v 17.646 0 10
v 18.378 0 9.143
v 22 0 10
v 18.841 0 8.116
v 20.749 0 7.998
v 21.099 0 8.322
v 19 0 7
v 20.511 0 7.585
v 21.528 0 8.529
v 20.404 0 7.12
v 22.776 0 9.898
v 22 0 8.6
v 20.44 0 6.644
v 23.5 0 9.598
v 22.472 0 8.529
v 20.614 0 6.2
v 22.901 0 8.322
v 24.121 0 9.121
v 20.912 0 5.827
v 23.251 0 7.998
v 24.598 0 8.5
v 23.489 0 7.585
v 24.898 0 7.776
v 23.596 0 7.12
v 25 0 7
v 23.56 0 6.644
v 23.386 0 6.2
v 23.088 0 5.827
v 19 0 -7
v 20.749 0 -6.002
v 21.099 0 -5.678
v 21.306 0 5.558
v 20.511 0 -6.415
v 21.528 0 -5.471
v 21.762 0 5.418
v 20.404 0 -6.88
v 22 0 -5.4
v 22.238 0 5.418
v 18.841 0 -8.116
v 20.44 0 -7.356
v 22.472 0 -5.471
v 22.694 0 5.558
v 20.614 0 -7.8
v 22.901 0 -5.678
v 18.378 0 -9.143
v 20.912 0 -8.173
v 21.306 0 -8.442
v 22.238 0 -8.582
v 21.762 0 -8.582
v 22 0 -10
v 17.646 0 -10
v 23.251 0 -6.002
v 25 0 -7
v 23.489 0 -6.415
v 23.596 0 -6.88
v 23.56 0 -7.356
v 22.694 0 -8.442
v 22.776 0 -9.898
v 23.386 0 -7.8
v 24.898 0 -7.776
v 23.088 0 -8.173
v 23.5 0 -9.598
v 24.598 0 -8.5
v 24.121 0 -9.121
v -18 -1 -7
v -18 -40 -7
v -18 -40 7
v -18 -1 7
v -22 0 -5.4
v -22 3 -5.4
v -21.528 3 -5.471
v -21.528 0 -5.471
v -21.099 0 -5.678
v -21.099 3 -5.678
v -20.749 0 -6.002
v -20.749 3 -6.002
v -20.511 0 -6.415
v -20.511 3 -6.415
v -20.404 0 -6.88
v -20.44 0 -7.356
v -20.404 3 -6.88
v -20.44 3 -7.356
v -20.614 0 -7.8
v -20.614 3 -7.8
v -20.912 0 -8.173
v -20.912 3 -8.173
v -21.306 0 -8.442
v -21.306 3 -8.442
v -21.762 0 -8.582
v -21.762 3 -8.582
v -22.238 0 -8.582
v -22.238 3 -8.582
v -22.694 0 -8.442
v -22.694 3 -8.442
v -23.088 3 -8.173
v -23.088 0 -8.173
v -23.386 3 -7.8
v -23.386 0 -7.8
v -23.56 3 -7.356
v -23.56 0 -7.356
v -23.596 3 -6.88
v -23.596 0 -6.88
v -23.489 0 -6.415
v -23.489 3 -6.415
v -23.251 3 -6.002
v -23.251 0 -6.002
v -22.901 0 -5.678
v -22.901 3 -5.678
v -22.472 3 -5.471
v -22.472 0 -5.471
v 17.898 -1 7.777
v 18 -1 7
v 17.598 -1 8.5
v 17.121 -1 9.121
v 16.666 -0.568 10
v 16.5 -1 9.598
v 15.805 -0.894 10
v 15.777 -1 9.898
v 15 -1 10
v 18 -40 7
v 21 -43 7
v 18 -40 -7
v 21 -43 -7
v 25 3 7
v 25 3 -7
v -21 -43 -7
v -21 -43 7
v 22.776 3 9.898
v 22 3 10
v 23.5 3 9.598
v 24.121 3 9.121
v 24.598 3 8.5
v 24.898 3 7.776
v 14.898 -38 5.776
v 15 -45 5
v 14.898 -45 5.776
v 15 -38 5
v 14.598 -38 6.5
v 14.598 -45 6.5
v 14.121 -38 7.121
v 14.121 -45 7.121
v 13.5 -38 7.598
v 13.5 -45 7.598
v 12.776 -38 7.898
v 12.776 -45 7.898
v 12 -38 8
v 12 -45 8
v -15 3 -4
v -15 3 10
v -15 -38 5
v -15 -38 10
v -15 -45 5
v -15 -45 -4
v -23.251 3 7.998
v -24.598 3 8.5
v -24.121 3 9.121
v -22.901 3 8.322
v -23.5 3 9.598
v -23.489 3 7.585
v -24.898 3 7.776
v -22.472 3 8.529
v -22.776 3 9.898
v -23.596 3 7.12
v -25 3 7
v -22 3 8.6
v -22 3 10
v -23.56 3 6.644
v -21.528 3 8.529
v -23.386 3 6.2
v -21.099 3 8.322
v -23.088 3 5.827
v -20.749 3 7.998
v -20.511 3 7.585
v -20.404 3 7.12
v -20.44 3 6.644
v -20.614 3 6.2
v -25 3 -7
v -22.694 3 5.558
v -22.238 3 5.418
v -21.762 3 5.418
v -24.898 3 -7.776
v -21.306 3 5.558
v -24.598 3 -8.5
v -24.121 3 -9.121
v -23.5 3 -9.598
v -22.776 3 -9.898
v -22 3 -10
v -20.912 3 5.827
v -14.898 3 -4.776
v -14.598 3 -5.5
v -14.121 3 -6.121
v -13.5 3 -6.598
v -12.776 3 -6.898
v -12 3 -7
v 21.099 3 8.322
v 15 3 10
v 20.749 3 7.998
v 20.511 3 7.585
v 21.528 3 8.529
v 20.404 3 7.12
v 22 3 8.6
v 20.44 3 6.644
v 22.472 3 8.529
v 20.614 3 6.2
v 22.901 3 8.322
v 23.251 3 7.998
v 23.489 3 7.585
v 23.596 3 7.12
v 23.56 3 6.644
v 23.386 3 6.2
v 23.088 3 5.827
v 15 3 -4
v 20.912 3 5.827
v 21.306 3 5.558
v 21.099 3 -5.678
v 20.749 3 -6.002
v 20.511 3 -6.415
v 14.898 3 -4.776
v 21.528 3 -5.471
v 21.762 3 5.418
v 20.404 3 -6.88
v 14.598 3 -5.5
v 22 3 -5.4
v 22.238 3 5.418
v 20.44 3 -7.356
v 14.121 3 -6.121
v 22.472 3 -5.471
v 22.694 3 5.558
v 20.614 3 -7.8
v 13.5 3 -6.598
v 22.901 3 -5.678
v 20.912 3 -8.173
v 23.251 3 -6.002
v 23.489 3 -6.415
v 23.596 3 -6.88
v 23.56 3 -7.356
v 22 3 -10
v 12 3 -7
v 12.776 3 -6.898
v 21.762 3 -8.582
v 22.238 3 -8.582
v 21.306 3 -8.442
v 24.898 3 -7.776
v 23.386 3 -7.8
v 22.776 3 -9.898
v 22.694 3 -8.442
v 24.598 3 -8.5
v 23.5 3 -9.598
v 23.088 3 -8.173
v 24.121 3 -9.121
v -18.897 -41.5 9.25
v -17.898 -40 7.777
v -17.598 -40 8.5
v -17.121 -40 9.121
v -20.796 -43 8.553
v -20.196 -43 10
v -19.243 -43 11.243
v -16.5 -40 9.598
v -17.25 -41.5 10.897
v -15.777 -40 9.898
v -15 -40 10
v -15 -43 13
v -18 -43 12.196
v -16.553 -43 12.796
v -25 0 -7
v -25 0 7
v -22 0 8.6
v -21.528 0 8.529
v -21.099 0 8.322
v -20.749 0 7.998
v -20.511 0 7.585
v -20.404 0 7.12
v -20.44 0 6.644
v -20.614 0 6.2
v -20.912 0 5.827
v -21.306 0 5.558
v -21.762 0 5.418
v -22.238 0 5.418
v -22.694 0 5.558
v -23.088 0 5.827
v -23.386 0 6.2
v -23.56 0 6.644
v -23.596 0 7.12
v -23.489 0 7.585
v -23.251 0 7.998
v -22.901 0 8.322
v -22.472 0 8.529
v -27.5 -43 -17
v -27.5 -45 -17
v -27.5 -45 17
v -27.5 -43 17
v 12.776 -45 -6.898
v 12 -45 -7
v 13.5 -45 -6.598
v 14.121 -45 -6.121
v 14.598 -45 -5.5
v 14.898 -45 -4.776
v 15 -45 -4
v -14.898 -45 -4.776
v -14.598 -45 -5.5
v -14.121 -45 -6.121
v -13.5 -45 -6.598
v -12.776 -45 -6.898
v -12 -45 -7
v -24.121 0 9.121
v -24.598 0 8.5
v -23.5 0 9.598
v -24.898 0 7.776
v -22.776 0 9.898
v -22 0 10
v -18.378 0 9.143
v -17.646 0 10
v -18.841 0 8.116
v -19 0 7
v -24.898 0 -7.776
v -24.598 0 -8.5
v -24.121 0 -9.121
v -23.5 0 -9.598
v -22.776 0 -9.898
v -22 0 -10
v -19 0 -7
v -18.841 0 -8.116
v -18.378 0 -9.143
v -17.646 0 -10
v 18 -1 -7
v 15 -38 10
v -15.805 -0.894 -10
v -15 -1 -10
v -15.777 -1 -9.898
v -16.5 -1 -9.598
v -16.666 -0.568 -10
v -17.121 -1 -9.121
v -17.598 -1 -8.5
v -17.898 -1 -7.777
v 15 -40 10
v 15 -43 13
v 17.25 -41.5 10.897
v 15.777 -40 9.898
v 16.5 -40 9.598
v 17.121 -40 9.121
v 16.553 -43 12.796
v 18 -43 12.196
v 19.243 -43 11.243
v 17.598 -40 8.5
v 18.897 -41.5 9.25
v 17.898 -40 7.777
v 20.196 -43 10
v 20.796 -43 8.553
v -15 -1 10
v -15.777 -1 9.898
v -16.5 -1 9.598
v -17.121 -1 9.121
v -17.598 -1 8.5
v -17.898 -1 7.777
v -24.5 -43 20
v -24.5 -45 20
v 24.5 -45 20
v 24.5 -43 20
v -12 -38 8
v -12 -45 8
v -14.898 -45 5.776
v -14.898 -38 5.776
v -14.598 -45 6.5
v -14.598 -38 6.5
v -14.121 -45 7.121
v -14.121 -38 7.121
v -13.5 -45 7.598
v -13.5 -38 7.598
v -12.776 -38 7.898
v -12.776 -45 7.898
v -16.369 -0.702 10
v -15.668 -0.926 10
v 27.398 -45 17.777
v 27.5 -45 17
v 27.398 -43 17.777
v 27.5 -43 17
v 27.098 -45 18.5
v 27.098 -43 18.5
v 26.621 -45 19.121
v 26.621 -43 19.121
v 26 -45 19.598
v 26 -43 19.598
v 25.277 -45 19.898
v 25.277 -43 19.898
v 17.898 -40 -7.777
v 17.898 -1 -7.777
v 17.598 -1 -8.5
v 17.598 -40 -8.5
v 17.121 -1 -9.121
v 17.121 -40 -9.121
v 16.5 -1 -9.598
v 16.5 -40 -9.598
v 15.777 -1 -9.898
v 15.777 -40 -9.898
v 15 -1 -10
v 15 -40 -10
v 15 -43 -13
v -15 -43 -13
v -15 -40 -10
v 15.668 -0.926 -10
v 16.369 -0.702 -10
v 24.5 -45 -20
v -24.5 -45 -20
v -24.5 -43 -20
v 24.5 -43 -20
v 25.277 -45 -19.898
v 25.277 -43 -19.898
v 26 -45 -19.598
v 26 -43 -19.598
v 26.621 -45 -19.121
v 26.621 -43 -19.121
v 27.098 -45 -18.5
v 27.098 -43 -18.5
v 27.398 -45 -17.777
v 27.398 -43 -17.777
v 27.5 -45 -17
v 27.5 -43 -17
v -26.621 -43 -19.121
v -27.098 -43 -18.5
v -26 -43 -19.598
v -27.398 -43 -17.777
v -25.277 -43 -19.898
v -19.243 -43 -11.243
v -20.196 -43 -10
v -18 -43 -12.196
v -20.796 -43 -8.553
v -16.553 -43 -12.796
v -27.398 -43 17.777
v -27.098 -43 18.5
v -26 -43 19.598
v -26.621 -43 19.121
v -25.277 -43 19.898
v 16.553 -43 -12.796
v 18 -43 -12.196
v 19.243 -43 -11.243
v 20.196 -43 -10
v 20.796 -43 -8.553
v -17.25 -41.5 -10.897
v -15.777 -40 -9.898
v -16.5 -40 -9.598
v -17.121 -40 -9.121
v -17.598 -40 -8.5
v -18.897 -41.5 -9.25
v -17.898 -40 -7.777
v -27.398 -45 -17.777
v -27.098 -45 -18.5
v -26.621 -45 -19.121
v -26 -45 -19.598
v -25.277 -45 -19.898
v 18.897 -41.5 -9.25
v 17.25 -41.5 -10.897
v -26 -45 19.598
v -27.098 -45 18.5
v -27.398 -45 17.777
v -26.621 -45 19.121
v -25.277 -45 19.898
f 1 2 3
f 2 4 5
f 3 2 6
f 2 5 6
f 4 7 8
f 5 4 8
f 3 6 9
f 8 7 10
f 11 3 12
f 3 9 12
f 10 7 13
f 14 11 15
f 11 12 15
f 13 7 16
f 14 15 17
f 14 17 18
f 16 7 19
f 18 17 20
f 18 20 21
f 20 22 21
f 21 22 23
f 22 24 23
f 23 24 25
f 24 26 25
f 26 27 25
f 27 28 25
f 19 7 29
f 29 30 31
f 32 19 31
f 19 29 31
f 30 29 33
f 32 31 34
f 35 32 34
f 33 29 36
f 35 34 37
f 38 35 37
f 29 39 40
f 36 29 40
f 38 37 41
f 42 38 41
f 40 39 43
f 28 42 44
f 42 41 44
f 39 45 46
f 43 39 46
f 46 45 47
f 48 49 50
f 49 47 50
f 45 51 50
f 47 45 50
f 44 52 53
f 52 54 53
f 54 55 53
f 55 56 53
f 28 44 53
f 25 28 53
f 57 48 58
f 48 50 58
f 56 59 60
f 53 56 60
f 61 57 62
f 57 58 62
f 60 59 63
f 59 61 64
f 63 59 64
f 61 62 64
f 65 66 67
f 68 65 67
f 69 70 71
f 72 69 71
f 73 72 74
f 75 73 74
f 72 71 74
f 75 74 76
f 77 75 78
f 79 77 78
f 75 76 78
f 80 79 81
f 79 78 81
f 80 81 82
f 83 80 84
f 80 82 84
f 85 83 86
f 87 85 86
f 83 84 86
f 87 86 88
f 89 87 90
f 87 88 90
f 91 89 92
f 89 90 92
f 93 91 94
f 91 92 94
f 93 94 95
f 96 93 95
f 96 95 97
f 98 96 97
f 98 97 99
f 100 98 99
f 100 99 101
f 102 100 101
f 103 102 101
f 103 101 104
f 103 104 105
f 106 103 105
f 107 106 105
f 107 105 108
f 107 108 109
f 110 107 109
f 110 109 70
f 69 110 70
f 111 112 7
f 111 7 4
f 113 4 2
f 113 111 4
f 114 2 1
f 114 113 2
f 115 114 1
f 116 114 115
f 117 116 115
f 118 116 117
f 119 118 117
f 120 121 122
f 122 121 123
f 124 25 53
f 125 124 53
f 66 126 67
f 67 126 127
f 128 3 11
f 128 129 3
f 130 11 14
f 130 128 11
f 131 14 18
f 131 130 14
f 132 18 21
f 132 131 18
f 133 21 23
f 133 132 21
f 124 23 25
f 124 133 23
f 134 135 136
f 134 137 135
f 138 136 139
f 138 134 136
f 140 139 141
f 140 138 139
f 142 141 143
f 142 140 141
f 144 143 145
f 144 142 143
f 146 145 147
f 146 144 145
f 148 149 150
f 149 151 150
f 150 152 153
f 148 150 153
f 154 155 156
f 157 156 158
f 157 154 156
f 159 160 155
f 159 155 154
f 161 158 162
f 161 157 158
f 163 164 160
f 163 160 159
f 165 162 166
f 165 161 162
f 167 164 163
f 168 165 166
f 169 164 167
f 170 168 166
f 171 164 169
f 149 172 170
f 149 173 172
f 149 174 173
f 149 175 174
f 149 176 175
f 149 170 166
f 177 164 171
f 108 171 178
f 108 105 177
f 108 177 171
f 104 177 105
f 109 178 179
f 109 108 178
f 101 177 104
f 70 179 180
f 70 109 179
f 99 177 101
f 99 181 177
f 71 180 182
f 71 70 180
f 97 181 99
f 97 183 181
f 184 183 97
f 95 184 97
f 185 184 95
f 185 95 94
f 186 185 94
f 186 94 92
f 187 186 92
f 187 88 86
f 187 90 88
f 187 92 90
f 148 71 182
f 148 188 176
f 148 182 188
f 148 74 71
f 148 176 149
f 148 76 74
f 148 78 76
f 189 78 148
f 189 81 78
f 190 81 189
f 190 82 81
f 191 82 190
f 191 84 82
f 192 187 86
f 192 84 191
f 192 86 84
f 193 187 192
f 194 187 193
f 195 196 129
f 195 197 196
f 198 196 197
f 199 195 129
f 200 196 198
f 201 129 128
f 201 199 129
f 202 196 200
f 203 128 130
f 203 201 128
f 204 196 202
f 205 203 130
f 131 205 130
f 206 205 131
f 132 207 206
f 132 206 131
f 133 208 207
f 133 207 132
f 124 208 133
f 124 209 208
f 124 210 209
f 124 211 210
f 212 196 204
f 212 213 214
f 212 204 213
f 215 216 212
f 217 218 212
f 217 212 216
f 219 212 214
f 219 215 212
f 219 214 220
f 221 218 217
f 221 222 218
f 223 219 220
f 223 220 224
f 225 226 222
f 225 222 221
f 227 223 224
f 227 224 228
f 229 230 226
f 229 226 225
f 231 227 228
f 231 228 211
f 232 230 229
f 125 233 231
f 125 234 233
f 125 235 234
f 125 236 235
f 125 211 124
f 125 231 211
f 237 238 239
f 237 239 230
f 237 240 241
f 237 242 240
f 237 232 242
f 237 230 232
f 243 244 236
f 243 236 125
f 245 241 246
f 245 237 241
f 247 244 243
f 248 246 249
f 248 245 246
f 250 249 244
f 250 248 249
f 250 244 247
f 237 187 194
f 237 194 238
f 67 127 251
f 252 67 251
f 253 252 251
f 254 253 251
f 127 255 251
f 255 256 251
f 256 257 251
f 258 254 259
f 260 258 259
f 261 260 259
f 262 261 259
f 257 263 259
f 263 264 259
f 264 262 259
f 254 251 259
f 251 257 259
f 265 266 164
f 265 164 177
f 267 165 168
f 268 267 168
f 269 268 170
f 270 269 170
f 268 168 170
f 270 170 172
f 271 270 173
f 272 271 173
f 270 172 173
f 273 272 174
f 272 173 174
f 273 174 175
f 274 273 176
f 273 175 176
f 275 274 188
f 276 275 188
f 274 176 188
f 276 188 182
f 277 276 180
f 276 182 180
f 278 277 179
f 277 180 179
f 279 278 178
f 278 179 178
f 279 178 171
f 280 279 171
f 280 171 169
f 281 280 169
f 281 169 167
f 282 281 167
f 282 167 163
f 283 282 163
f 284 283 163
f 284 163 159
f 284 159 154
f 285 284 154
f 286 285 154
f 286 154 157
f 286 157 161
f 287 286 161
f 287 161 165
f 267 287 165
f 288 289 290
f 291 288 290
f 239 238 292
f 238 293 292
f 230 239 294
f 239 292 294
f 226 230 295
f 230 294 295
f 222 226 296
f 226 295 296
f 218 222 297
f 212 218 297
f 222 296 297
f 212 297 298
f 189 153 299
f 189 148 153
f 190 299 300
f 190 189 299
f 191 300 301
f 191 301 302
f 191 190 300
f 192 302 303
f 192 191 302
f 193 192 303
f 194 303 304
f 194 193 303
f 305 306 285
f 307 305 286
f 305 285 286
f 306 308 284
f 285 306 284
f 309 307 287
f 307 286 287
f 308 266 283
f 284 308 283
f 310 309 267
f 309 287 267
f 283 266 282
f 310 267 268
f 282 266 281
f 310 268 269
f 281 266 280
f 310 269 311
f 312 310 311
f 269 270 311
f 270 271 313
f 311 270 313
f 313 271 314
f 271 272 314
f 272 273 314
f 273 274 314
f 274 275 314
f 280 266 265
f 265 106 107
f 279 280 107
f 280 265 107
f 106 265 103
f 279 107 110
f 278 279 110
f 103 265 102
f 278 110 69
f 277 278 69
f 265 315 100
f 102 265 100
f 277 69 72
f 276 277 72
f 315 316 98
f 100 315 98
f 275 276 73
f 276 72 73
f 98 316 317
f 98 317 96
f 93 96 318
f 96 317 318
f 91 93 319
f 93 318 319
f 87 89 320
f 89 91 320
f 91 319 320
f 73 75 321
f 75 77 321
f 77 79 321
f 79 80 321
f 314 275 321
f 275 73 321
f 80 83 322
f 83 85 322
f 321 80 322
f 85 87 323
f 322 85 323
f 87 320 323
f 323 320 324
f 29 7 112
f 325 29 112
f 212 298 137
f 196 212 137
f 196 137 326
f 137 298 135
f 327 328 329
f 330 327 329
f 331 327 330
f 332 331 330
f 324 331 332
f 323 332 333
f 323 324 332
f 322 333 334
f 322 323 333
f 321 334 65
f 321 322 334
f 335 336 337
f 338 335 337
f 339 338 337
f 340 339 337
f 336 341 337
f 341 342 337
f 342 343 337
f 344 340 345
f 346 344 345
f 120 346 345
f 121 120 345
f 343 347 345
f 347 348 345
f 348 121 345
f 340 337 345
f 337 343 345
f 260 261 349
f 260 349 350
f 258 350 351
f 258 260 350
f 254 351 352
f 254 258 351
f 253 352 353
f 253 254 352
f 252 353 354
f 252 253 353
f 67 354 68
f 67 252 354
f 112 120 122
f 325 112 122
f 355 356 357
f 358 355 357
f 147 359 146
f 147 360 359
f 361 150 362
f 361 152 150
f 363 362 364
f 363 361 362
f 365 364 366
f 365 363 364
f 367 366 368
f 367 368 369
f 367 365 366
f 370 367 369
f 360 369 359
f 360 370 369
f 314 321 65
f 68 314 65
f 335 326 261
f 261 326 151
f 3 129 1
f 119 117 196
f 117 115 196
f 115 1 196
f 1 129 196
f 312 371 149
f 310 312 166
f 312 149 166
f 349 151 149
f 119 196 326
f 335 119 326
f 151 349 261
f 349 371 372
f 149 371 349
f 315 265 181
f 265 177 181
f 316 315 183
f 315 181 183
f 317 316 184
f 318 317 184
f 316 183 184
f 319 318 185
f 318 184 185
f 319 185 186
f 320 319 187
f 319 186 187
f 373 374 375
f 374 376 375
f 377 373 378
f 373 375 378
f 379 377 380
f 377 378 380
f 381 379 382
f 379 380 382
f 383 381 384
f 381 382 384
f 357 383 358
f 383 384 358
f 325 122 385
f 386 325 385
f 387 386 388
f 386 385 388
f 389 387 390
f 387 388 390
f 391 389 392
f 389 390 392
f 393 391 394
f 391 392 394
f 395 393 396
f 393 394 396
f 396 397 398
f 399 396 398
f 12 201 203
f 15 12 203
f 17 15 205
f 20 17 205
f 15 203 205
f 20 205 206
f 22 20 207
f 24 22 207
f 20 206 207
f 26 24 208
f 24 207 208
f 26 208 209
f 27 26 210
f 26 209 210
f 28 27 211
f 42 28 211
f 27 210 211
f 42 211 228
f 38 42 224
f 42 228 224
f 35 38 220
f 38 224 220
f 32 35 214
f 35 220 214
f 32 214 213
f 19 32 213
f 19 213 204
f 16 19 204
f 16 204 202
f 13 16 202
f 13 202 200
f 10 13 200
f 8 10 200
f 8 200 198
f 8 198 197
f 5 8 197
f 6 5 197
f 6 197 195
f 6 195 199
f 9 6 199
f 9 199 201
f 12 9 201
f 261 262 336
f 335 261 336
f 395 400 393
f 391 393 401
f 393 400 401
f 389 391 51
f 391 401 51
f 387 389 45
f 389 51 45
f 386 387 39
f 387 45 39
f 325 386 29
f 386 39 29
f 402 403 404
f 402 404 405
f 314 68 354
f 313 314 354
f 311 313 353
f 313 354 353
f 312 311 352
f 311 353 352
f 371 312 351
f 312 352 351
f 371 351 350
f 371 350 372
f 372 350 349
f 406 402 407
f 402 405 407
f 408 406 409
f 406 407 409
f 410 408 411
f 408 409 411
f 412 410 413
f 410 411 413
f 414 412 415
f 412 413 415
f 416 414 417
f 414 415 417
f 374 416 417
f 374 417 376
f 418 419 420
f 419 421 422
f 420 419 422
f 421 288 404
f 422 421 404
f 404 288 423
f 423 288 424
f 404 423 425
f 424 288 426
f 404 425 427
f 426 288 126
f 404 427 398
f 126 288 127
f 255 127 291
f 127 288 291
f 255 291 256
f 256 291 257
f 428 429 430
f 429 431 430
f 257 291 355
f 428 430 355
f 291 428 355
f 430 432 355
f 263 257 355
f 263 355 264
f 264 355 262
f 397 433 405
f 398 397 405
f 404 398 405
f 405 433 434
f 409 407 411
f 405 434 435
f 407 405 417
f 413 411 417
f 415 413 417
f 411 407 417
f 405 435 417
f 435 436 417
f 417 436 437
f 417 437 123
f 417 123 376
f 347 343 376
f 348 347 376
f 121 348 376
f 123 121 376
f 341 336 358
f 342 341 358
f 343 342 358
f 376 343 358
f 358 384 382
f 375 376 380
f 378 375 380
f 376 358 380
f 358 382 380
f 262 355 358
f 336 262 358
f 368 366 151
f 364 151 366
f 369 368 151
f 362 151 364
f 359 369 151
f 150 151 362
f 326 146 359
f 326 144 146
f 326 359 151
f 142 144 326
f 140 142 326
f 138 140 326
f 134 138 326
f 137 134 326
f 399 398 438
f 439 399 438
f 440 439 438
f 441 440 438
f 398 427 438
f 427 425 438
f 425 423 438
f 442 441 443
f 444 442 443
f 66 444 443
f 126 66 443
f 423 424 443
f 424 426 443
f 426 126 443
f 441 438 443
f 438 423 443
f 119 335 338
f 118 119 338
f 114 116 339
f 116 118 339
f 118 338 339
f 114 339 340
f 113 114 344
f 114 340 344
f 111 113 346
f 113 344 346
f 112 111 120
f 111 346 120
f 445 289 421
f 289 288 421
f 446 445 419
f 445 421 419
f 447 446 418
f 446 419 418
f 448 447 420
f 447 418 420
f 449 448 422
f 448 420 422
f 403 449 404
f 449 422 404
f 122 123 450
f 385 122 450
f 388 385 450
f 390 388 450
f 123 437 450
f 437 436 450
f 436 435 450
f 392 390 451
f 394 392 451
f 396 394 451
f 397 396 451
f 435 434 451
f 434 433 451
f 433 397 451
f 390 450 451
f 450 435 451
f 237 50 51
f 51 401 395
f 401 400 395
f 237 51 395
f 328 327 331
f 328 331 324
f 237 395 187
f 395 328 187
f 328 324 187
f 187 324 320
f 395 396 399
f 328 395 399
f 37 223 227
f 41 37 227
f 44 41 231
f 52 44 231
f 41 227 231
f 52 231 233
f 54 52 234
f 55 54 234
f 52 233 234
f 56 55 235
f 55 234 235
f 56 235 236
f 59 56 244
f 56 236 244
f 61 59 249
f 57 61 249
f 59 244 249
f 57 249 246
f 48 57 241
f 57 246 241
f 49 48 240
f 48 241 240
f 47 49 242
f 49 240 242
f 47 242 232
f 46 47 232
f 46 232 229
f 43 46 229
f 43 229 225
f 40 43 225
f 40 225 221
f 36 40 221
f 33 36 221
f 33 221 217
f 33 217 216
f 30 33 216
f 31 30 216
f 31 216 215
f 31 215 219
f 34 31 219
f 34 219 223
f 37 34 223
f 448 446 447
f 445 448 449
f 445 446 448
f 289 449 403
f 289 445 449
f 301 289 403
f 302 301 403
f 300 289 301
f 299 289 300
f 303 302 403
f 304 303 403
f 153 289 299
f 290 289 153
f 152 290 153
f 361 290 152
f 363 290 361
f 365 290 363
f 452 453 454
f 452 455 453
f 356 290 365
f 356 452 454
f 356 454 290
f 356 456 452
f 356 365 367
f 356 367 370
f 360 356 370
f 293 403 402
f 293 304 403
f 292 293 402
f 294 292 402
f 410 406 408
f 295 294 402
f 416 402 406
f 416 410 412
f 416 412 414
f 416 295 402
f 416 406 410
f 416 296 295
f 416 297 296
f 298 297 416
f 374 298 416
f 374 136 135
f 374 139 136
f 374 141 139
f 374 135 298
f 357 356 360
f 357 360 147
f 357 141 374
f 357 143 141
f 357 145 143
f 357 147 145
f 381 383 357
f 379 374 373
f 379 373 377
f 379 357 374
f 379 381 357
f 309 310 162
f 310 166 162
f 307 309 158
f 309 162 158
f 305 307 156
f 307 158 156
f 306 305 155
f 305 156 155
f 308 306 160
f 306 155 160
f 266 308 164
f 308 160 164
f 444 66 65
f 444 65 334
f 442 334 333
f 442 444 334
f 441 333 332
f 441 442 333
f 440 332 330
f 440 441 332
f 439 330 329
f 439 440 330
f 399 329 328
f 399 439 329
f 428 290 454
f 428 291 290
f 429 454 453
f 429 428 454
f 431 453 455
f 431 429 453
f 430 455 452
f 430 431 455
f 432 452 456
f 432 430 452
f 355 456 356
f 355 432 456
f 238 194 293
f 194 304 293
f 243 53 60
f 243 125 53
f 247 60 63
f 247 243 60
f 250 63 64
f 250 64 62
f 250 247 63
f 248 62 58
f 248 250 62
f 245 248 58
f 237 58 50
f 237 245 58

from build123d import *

# Parameters (mm, degrees)
SKETCH_1_W          = 30
SKETCH_1_H          = 3
EXTRUDE_1_DEPTH     = 45
SKETCH_1_3_W        = 7
SKETCH_1_3_H        = 20
SKETCH_1_3_W_2      = 30
SKETCH_1_3_H_2      = 3
EXTRUDE_2_DEPTH     = 3
SKETCH_2_W          = 55
SKETCH_2_H          = 40
EXTRUDE_3_DEPTH     = 2
SKETCH_3_W          = 30
SKETCH_3_H          = 2
EXTRUDE_4_DEPTH     = 5
SKETCH_4_W          = 30
SKETCH_4_H          = 15
CUT_EXTRUDE_1_DEPTH = 58.203583804
CUT_EXTRUDE_2_REACH = 60.824
SKETCH_6_R          = 1.6
FILLET_1_R          = 3
FILLET_2_R          = 3
CHAMFER_1_SIZE      = 3
CHAMFER_2_SIZE      = 1
FILLET_4_R          = 3


# Some blends are built 0.0001 mm under size
with BuildPart() as part:
    # 草图1 → 凸台-拉伸1 (new body)
    with BuildSketch(Plane(origin=(0, 0, 0), x_dir=(1, 0, 0), z_dir=(0, 1, 0))):
        Polygon((18, 10), (15, 10), (15, 7), (15, -10), (18, -10), align=None)
        with Locations((0, 8.5)):
            Rectangle(SKETCH_1_W, SKETCH_1_H)
        Polygon((-15, 7), (-15, 10), (-18, 10), (-18, -10), (-15, -10), align=None)
    extrude(amount=-EXTRUDE_1_DEPTH)

    # 草图1<3> → 凸台-拉伸2 (add)
    with BuildSketch(Plane(origin=(0, 0, 0), x_dir=(1, 0, 0), z_dir=(0, 1, 0))):
        with Locations((-21.5, 0)):
            Rectangle(SKETCH_1_3_W, SKETCH_1_3_H)
        Polygon((-15, 7), (-15, 10), (-18, 10), (-18, -10), (-15, -10), align=None)
        with Locations((0, 8.5)):
            Rectangle(SKETCH_1_3_W_2, SKETCH_1_3_H_2)
        Polygon((18, 10), (15, 10), (15, 7), (15, -10), (18, -10), align=None)
        with Locations((21.5, 0)):
            Rectangle(SKETCH_1_3_W, SKETCH_1_3_H)
    extrude(amount=EXTRUDE_2_DEPTH)

    # 草图2 → 凸台-拉伸3 (add)
    with BuildSketch(Plane.XZ.offset(45)):
        Rectangle(SKETCH_2_W, SKETCH_2_H)
    extrude(amount=-EXTRUDE_3_DEPTH)

    # 草图3 → 凸台-拉伸4 (add)
    with BuildSketch(Plane(origin=(0, -43, 0), x_dir=(1, 0, 0), z_dir=(0, 1, 0))):
        with Locations((0, -9)):
            Rectangle(SKETCH_3_W, SKETCH_3_H)
    extrude(amount=EXTRUDE_4_DEPTH)

    # 草图4 → 切除-拉伸1 (cut, through all)
    with BuildSketch(Plane(origin=(0, -43, 0), x_dir=(1, 0, 0), z_dir=(0, 1, 0))):
        with Locations((0, -0.5)):
            Rectangle(SKETCH_4_W, SKETCH_4_H)
    extrude(amount=-CUT_EXTRUDE_1_DEPTH, mode=Mode.SUBTRACT)

    # 草图6 → 切除-拉伸2 (cut, up to next)
    with BuildSketch(Plane(origin=(0, 3, 0), x_dir=(1, 0, 0), z_dir=(0, 1, 0)), mode=Mode.PRIVATE) as cut_extrude_2_sk1:
        with Locations(Location((-22, -7, 0), (0, 0, 270))):
            Circle(SKETCH_6_R)
    cut_extrude_2_tool1 = extrude(cut_extrude_2_sk1.sketch, amount=-CUT_EXTRUDE_2_REACH, mode=Mode.PRIVATE) & part.part
    # 草图6 → 切除-拉伸2 (cut, up to next)
    with BuildSketch(Plane(origin=(0, 3, 0), x_dir=(1, 0, 0), z_dir=(0, 1, 0)), mode=Mode.PRIVATE) as cut_extrude_2_sk2:
        with Locations(Location((-22, 7, 0), (0, 0, 270))):
            Circle(SKETCH_6_R)
    cut_extrude_2_tool2 = extrude(cut_extrude_2_sk2.sketch, amount=-CUT_EXTRUDE_2_REACH, mode=Mode.PRIVATE) & part.part
    # 草图6 → 切除-拉伸2 (cut, up to next)
    with BuildSketch(Plane(origin=(0, 3, 0), x_dir=(1, 0, 0), z_dir=(0, 1, 0)), mode=Mode.PRIVATE) as cut_extrude_2_sk3:
        with Locations(Location((22, -7, 0), (0, 0, 270))):
            Circle(SKETCH_6_R)
    cut_extrude_2_tool3 = extrude(cut_extrude_2_sk3.sketch, amount=-CUT_EXTRUDE_2_REACH, mode=Mode.PRIVATE) & part.part
    # 草图6 → 切除-拉伸2 (cut, up to next)
    with BuildSketch(Plane(origin=(0, 3, 0), x_dir=(1, 0, 0), z_dir=(0, 1, 0)), mode=Mode.PRIVATE) as cut_extrude_2_sk4:
        with Locations(Location((22, 7, 0), (0, 0, 270))):
            Circle(SKETCH_6_R)
    cut_extrude_2_tool4 = extrude(cut_extrude_2_sk4.sketch, amount=-CUT_EXTRUDE_2_REACH, mode=Mode.PRIVATE) & part.part
    add(cut_extrude_2_tool1.solids().sort_by_distance((-22, 3, 7))[0], mode=Mode.SUBTRACT)
    add(cut_extrude_2_tool2.solids().sort_by_distance((-22, 3, -7))[0], mode=Mode.SUBTRACT)
    add(cut_extrude_2_tool3.solids().sort_by_distance((22, 3, 7))[0], mode=Mode.SUBTRACT)
    add(cut_extrude_2_tool4.solids().sort_by_distance((22, 3, -7))[0], mode=Mode.SUBTRACT)

    # 圆角1
    fillet_1_edges = [part.edges().sort_by_distance(p)[0] for p in [
        (-25, 1.5, 10),
        (25, 1.5, 10),
        (25, 1.5, -10),
        (-25, 1.5, -10),
    ]]
    fillet(fillet_1_edges, radius=FILLET_1_R)

    # 圆角2
    fillet_2_edges = [part.edges().sort_by_distance(p)[0] for p in [
        (-18, -21.5, -10),
        (18, -21.5, -10),
        (-18, -21.5, 10),
        (18, -21.5, 10),
        (27.5, -44, 20),
        (27.5, -44, -20),
        (-27.5, -44, -20),
        (-27.5, -44, 20),
    ]]
    fillet(fillet_2_edges, radius=FILLET_2_R - 0.0001)  # a hair under: the kernel refuses the full size

    # 倒角1
    chamfer_1_edges = [part.edges().sort_by_distance(p)[0] for p in [
        (0, -43, 10),
        (-18, -43, 0),
        (0, -43, -10),
        (18, -43, 0),
        (17.121349633, -43, 9.121349633),
        (-17.121349633, -43, 9.121349633),
        (17.121349633, -43, -9.121349633),
        (-17.121349633, -43, -9.121349633),
    ]]
    chamfer(chamfer_1_edges, length=CHAMFER_1_SIZE)

    # 倒角2
    # the kernel refuses this chamfer: 1 mm, written as the material it adds along each edge
    with BuildSketch(Plane(origin=(18, 0, 7.0001), x_dir=(0.9996219169112968, 0.027495876610586247, 0), z_dir=(0, 0, -1)), Plane(origin=(-18, 0, -7.0001), x_dir=(-0.9996219169112968, 0.02749587661058639, 0), z_dir=(0, 0, 1))) as chamfer_2_piece_1:
        Polygon((CHAMFER_2_SIZE * 0.999621916911, CHAMFER_2_SIZE * 0.0274958766106), (-CHAMFER_2_SIZE * 0.0274958766106, CHAMFER_2_SIZE * 0.999621916911), (0, 0), align=None)
    extrude(amount=14.0002)
    with BuildSketch(Plane(origin=(15.0001, 0, 7.0001), x_dir=(1, 0, 0), z_dir=(0, 0, -1))) as chamfer_2_piece_2_section:
        Polygon((2.9999 + CHAMFER_2_SIZE, 0), (2.9999, CHAMFER_2_SIZE), (2.9999, 0), align=None)
    chamfer_2_piece_2 = revolve(axis=Axis((15.0001, 0, 7.0001), (0, -1, 0)), revolution_arc=139.136895156, mode=Mode.PRIVATE)
    chamfer_2_piece_2 = split(chamfer_2_piece_2, bisect_by=Plane(origin=(18.290229606, -0.281148304, 10), z_dir=(0, 0, -1)), keep=Keep.TOP, mode=Mode.PRIVATE)
    chamfer_2_piece_2 = split(chamfer_2_piece_2, bisect_by=Plane(origin=(15, -0.281148304, 7.827153976), z_dir=(1, 0, 0)), keep=Keep.TOP, mode=Mode.PRIVATE)
    add(chamfer_2_piece_2)
    with BuildSketch(Plane(origin=(-15.0001, 0, 7.0001), x_dir=(-1, 0, 0), z_dir=(0, 0, -1))) as chamfer_2_piece_3_section:
        Polygon((2.9999 + CHAMFER_2_SIZE, 0), (2.9999, -CHAMFER_2_SIZE), (2.9999, 0), align=None)
    chamfer_2_piece_3 = revolve(axis=Axis((-15.0001, 0, 7.0001), (0, 1, 0)), revolution_arc=139.136895156, mode=Mode.PRIVATE)
    chamfer_2_piece_3 = split(chamfer_2_piece_3, bisect_by=Plane(origin=(-18.290229606, -0.281148304, 10), z_dir=(0, 0, -1)), keep=Keep.TOP, mode=Mode.PRIVATE)
    chamfer_2_piece_3 = split(chamfer_2_piece_3, bisect_by=Plane(origin=(-15, -0.281148304, 7.827153976), z_dir=(-1, 0, 0)), keep=Keep.TOP, mode=Mode.PRIVATE)
    add(chamfer_2_piece_3)
    with BuildSketch(Plane(origin=(15.0001, 0, -7.0001), x_dir=(-0.7562749275069748, 0, -0.6542539522420326), z_dir=(-0.6542539522420326, 0, 0.7562749275069748))) as chamfer_2_piece_4_section:
        Polygon((2.9999, CHAMFER_2_SIZE), (2.9999 + CHAMFER_2_SIZE, 0), (2.9999, 0), align=None)
    chamfer_2_piece_4 = revolve(axis=Axis((15.0001, 0, -7.0001), (0, -1, 0)), revolution_arc=139.136895156, mode=Mode.PRIVATE)
    chamfer_2_piece_4 = split(chamfer_2_piece_4, bisect_by=Plane(origin=(17.219196031, -0.376233932, -10), z_dir=(0, 0, 1)), keep=Keep.TOP, mode=Mode.PRIVATE)
    add(chamfer_2_piece_4)
    with BuildSketch(Plane(origin=(-15.0001, 0, -7.0001), x_dir=(0.7562749275069739, 0, -0.6542539522420336), z_dir=(0.6542539522420336, 0, 0.7562749275069739))) as chamfer_2_piece_5_section:
        Polygon((2.9999, -CHAMFER_2_SIZE), (2.9999 + CHAMFER_2_SIZE, 0), (2.9999, 0), align=None)
    chamfer_2_piece_5 = revolve(axis=Axis((-15.0001, 0, -7.0001), (0, 1, 0)), revolution_arc=139.136895156, mode=Mode.PRIVATE)
    chamfer_2_piece_5 = split(chamfer_2_piece_5, bisect_by=Plane(origin=(-17.219196031, -0.376233932, -10), z_dir=(0, 0, 1)), keep=Keep.TOP, mode=Mode.PRIVATE)
    add(chamfer_2_piece_5)

    # 圆角4
    fillet_4_edges = [part.edges().sort_by_distance(p)[0] for p in [
        (-15, -21, -7),
        (15, -21, -7),
        (-15, -41.5, 8),
        (15, -41.5, 8),
    ]]
    fillet(fillet_4_edges, radius=FILLET_4_R)


solid = part.part
